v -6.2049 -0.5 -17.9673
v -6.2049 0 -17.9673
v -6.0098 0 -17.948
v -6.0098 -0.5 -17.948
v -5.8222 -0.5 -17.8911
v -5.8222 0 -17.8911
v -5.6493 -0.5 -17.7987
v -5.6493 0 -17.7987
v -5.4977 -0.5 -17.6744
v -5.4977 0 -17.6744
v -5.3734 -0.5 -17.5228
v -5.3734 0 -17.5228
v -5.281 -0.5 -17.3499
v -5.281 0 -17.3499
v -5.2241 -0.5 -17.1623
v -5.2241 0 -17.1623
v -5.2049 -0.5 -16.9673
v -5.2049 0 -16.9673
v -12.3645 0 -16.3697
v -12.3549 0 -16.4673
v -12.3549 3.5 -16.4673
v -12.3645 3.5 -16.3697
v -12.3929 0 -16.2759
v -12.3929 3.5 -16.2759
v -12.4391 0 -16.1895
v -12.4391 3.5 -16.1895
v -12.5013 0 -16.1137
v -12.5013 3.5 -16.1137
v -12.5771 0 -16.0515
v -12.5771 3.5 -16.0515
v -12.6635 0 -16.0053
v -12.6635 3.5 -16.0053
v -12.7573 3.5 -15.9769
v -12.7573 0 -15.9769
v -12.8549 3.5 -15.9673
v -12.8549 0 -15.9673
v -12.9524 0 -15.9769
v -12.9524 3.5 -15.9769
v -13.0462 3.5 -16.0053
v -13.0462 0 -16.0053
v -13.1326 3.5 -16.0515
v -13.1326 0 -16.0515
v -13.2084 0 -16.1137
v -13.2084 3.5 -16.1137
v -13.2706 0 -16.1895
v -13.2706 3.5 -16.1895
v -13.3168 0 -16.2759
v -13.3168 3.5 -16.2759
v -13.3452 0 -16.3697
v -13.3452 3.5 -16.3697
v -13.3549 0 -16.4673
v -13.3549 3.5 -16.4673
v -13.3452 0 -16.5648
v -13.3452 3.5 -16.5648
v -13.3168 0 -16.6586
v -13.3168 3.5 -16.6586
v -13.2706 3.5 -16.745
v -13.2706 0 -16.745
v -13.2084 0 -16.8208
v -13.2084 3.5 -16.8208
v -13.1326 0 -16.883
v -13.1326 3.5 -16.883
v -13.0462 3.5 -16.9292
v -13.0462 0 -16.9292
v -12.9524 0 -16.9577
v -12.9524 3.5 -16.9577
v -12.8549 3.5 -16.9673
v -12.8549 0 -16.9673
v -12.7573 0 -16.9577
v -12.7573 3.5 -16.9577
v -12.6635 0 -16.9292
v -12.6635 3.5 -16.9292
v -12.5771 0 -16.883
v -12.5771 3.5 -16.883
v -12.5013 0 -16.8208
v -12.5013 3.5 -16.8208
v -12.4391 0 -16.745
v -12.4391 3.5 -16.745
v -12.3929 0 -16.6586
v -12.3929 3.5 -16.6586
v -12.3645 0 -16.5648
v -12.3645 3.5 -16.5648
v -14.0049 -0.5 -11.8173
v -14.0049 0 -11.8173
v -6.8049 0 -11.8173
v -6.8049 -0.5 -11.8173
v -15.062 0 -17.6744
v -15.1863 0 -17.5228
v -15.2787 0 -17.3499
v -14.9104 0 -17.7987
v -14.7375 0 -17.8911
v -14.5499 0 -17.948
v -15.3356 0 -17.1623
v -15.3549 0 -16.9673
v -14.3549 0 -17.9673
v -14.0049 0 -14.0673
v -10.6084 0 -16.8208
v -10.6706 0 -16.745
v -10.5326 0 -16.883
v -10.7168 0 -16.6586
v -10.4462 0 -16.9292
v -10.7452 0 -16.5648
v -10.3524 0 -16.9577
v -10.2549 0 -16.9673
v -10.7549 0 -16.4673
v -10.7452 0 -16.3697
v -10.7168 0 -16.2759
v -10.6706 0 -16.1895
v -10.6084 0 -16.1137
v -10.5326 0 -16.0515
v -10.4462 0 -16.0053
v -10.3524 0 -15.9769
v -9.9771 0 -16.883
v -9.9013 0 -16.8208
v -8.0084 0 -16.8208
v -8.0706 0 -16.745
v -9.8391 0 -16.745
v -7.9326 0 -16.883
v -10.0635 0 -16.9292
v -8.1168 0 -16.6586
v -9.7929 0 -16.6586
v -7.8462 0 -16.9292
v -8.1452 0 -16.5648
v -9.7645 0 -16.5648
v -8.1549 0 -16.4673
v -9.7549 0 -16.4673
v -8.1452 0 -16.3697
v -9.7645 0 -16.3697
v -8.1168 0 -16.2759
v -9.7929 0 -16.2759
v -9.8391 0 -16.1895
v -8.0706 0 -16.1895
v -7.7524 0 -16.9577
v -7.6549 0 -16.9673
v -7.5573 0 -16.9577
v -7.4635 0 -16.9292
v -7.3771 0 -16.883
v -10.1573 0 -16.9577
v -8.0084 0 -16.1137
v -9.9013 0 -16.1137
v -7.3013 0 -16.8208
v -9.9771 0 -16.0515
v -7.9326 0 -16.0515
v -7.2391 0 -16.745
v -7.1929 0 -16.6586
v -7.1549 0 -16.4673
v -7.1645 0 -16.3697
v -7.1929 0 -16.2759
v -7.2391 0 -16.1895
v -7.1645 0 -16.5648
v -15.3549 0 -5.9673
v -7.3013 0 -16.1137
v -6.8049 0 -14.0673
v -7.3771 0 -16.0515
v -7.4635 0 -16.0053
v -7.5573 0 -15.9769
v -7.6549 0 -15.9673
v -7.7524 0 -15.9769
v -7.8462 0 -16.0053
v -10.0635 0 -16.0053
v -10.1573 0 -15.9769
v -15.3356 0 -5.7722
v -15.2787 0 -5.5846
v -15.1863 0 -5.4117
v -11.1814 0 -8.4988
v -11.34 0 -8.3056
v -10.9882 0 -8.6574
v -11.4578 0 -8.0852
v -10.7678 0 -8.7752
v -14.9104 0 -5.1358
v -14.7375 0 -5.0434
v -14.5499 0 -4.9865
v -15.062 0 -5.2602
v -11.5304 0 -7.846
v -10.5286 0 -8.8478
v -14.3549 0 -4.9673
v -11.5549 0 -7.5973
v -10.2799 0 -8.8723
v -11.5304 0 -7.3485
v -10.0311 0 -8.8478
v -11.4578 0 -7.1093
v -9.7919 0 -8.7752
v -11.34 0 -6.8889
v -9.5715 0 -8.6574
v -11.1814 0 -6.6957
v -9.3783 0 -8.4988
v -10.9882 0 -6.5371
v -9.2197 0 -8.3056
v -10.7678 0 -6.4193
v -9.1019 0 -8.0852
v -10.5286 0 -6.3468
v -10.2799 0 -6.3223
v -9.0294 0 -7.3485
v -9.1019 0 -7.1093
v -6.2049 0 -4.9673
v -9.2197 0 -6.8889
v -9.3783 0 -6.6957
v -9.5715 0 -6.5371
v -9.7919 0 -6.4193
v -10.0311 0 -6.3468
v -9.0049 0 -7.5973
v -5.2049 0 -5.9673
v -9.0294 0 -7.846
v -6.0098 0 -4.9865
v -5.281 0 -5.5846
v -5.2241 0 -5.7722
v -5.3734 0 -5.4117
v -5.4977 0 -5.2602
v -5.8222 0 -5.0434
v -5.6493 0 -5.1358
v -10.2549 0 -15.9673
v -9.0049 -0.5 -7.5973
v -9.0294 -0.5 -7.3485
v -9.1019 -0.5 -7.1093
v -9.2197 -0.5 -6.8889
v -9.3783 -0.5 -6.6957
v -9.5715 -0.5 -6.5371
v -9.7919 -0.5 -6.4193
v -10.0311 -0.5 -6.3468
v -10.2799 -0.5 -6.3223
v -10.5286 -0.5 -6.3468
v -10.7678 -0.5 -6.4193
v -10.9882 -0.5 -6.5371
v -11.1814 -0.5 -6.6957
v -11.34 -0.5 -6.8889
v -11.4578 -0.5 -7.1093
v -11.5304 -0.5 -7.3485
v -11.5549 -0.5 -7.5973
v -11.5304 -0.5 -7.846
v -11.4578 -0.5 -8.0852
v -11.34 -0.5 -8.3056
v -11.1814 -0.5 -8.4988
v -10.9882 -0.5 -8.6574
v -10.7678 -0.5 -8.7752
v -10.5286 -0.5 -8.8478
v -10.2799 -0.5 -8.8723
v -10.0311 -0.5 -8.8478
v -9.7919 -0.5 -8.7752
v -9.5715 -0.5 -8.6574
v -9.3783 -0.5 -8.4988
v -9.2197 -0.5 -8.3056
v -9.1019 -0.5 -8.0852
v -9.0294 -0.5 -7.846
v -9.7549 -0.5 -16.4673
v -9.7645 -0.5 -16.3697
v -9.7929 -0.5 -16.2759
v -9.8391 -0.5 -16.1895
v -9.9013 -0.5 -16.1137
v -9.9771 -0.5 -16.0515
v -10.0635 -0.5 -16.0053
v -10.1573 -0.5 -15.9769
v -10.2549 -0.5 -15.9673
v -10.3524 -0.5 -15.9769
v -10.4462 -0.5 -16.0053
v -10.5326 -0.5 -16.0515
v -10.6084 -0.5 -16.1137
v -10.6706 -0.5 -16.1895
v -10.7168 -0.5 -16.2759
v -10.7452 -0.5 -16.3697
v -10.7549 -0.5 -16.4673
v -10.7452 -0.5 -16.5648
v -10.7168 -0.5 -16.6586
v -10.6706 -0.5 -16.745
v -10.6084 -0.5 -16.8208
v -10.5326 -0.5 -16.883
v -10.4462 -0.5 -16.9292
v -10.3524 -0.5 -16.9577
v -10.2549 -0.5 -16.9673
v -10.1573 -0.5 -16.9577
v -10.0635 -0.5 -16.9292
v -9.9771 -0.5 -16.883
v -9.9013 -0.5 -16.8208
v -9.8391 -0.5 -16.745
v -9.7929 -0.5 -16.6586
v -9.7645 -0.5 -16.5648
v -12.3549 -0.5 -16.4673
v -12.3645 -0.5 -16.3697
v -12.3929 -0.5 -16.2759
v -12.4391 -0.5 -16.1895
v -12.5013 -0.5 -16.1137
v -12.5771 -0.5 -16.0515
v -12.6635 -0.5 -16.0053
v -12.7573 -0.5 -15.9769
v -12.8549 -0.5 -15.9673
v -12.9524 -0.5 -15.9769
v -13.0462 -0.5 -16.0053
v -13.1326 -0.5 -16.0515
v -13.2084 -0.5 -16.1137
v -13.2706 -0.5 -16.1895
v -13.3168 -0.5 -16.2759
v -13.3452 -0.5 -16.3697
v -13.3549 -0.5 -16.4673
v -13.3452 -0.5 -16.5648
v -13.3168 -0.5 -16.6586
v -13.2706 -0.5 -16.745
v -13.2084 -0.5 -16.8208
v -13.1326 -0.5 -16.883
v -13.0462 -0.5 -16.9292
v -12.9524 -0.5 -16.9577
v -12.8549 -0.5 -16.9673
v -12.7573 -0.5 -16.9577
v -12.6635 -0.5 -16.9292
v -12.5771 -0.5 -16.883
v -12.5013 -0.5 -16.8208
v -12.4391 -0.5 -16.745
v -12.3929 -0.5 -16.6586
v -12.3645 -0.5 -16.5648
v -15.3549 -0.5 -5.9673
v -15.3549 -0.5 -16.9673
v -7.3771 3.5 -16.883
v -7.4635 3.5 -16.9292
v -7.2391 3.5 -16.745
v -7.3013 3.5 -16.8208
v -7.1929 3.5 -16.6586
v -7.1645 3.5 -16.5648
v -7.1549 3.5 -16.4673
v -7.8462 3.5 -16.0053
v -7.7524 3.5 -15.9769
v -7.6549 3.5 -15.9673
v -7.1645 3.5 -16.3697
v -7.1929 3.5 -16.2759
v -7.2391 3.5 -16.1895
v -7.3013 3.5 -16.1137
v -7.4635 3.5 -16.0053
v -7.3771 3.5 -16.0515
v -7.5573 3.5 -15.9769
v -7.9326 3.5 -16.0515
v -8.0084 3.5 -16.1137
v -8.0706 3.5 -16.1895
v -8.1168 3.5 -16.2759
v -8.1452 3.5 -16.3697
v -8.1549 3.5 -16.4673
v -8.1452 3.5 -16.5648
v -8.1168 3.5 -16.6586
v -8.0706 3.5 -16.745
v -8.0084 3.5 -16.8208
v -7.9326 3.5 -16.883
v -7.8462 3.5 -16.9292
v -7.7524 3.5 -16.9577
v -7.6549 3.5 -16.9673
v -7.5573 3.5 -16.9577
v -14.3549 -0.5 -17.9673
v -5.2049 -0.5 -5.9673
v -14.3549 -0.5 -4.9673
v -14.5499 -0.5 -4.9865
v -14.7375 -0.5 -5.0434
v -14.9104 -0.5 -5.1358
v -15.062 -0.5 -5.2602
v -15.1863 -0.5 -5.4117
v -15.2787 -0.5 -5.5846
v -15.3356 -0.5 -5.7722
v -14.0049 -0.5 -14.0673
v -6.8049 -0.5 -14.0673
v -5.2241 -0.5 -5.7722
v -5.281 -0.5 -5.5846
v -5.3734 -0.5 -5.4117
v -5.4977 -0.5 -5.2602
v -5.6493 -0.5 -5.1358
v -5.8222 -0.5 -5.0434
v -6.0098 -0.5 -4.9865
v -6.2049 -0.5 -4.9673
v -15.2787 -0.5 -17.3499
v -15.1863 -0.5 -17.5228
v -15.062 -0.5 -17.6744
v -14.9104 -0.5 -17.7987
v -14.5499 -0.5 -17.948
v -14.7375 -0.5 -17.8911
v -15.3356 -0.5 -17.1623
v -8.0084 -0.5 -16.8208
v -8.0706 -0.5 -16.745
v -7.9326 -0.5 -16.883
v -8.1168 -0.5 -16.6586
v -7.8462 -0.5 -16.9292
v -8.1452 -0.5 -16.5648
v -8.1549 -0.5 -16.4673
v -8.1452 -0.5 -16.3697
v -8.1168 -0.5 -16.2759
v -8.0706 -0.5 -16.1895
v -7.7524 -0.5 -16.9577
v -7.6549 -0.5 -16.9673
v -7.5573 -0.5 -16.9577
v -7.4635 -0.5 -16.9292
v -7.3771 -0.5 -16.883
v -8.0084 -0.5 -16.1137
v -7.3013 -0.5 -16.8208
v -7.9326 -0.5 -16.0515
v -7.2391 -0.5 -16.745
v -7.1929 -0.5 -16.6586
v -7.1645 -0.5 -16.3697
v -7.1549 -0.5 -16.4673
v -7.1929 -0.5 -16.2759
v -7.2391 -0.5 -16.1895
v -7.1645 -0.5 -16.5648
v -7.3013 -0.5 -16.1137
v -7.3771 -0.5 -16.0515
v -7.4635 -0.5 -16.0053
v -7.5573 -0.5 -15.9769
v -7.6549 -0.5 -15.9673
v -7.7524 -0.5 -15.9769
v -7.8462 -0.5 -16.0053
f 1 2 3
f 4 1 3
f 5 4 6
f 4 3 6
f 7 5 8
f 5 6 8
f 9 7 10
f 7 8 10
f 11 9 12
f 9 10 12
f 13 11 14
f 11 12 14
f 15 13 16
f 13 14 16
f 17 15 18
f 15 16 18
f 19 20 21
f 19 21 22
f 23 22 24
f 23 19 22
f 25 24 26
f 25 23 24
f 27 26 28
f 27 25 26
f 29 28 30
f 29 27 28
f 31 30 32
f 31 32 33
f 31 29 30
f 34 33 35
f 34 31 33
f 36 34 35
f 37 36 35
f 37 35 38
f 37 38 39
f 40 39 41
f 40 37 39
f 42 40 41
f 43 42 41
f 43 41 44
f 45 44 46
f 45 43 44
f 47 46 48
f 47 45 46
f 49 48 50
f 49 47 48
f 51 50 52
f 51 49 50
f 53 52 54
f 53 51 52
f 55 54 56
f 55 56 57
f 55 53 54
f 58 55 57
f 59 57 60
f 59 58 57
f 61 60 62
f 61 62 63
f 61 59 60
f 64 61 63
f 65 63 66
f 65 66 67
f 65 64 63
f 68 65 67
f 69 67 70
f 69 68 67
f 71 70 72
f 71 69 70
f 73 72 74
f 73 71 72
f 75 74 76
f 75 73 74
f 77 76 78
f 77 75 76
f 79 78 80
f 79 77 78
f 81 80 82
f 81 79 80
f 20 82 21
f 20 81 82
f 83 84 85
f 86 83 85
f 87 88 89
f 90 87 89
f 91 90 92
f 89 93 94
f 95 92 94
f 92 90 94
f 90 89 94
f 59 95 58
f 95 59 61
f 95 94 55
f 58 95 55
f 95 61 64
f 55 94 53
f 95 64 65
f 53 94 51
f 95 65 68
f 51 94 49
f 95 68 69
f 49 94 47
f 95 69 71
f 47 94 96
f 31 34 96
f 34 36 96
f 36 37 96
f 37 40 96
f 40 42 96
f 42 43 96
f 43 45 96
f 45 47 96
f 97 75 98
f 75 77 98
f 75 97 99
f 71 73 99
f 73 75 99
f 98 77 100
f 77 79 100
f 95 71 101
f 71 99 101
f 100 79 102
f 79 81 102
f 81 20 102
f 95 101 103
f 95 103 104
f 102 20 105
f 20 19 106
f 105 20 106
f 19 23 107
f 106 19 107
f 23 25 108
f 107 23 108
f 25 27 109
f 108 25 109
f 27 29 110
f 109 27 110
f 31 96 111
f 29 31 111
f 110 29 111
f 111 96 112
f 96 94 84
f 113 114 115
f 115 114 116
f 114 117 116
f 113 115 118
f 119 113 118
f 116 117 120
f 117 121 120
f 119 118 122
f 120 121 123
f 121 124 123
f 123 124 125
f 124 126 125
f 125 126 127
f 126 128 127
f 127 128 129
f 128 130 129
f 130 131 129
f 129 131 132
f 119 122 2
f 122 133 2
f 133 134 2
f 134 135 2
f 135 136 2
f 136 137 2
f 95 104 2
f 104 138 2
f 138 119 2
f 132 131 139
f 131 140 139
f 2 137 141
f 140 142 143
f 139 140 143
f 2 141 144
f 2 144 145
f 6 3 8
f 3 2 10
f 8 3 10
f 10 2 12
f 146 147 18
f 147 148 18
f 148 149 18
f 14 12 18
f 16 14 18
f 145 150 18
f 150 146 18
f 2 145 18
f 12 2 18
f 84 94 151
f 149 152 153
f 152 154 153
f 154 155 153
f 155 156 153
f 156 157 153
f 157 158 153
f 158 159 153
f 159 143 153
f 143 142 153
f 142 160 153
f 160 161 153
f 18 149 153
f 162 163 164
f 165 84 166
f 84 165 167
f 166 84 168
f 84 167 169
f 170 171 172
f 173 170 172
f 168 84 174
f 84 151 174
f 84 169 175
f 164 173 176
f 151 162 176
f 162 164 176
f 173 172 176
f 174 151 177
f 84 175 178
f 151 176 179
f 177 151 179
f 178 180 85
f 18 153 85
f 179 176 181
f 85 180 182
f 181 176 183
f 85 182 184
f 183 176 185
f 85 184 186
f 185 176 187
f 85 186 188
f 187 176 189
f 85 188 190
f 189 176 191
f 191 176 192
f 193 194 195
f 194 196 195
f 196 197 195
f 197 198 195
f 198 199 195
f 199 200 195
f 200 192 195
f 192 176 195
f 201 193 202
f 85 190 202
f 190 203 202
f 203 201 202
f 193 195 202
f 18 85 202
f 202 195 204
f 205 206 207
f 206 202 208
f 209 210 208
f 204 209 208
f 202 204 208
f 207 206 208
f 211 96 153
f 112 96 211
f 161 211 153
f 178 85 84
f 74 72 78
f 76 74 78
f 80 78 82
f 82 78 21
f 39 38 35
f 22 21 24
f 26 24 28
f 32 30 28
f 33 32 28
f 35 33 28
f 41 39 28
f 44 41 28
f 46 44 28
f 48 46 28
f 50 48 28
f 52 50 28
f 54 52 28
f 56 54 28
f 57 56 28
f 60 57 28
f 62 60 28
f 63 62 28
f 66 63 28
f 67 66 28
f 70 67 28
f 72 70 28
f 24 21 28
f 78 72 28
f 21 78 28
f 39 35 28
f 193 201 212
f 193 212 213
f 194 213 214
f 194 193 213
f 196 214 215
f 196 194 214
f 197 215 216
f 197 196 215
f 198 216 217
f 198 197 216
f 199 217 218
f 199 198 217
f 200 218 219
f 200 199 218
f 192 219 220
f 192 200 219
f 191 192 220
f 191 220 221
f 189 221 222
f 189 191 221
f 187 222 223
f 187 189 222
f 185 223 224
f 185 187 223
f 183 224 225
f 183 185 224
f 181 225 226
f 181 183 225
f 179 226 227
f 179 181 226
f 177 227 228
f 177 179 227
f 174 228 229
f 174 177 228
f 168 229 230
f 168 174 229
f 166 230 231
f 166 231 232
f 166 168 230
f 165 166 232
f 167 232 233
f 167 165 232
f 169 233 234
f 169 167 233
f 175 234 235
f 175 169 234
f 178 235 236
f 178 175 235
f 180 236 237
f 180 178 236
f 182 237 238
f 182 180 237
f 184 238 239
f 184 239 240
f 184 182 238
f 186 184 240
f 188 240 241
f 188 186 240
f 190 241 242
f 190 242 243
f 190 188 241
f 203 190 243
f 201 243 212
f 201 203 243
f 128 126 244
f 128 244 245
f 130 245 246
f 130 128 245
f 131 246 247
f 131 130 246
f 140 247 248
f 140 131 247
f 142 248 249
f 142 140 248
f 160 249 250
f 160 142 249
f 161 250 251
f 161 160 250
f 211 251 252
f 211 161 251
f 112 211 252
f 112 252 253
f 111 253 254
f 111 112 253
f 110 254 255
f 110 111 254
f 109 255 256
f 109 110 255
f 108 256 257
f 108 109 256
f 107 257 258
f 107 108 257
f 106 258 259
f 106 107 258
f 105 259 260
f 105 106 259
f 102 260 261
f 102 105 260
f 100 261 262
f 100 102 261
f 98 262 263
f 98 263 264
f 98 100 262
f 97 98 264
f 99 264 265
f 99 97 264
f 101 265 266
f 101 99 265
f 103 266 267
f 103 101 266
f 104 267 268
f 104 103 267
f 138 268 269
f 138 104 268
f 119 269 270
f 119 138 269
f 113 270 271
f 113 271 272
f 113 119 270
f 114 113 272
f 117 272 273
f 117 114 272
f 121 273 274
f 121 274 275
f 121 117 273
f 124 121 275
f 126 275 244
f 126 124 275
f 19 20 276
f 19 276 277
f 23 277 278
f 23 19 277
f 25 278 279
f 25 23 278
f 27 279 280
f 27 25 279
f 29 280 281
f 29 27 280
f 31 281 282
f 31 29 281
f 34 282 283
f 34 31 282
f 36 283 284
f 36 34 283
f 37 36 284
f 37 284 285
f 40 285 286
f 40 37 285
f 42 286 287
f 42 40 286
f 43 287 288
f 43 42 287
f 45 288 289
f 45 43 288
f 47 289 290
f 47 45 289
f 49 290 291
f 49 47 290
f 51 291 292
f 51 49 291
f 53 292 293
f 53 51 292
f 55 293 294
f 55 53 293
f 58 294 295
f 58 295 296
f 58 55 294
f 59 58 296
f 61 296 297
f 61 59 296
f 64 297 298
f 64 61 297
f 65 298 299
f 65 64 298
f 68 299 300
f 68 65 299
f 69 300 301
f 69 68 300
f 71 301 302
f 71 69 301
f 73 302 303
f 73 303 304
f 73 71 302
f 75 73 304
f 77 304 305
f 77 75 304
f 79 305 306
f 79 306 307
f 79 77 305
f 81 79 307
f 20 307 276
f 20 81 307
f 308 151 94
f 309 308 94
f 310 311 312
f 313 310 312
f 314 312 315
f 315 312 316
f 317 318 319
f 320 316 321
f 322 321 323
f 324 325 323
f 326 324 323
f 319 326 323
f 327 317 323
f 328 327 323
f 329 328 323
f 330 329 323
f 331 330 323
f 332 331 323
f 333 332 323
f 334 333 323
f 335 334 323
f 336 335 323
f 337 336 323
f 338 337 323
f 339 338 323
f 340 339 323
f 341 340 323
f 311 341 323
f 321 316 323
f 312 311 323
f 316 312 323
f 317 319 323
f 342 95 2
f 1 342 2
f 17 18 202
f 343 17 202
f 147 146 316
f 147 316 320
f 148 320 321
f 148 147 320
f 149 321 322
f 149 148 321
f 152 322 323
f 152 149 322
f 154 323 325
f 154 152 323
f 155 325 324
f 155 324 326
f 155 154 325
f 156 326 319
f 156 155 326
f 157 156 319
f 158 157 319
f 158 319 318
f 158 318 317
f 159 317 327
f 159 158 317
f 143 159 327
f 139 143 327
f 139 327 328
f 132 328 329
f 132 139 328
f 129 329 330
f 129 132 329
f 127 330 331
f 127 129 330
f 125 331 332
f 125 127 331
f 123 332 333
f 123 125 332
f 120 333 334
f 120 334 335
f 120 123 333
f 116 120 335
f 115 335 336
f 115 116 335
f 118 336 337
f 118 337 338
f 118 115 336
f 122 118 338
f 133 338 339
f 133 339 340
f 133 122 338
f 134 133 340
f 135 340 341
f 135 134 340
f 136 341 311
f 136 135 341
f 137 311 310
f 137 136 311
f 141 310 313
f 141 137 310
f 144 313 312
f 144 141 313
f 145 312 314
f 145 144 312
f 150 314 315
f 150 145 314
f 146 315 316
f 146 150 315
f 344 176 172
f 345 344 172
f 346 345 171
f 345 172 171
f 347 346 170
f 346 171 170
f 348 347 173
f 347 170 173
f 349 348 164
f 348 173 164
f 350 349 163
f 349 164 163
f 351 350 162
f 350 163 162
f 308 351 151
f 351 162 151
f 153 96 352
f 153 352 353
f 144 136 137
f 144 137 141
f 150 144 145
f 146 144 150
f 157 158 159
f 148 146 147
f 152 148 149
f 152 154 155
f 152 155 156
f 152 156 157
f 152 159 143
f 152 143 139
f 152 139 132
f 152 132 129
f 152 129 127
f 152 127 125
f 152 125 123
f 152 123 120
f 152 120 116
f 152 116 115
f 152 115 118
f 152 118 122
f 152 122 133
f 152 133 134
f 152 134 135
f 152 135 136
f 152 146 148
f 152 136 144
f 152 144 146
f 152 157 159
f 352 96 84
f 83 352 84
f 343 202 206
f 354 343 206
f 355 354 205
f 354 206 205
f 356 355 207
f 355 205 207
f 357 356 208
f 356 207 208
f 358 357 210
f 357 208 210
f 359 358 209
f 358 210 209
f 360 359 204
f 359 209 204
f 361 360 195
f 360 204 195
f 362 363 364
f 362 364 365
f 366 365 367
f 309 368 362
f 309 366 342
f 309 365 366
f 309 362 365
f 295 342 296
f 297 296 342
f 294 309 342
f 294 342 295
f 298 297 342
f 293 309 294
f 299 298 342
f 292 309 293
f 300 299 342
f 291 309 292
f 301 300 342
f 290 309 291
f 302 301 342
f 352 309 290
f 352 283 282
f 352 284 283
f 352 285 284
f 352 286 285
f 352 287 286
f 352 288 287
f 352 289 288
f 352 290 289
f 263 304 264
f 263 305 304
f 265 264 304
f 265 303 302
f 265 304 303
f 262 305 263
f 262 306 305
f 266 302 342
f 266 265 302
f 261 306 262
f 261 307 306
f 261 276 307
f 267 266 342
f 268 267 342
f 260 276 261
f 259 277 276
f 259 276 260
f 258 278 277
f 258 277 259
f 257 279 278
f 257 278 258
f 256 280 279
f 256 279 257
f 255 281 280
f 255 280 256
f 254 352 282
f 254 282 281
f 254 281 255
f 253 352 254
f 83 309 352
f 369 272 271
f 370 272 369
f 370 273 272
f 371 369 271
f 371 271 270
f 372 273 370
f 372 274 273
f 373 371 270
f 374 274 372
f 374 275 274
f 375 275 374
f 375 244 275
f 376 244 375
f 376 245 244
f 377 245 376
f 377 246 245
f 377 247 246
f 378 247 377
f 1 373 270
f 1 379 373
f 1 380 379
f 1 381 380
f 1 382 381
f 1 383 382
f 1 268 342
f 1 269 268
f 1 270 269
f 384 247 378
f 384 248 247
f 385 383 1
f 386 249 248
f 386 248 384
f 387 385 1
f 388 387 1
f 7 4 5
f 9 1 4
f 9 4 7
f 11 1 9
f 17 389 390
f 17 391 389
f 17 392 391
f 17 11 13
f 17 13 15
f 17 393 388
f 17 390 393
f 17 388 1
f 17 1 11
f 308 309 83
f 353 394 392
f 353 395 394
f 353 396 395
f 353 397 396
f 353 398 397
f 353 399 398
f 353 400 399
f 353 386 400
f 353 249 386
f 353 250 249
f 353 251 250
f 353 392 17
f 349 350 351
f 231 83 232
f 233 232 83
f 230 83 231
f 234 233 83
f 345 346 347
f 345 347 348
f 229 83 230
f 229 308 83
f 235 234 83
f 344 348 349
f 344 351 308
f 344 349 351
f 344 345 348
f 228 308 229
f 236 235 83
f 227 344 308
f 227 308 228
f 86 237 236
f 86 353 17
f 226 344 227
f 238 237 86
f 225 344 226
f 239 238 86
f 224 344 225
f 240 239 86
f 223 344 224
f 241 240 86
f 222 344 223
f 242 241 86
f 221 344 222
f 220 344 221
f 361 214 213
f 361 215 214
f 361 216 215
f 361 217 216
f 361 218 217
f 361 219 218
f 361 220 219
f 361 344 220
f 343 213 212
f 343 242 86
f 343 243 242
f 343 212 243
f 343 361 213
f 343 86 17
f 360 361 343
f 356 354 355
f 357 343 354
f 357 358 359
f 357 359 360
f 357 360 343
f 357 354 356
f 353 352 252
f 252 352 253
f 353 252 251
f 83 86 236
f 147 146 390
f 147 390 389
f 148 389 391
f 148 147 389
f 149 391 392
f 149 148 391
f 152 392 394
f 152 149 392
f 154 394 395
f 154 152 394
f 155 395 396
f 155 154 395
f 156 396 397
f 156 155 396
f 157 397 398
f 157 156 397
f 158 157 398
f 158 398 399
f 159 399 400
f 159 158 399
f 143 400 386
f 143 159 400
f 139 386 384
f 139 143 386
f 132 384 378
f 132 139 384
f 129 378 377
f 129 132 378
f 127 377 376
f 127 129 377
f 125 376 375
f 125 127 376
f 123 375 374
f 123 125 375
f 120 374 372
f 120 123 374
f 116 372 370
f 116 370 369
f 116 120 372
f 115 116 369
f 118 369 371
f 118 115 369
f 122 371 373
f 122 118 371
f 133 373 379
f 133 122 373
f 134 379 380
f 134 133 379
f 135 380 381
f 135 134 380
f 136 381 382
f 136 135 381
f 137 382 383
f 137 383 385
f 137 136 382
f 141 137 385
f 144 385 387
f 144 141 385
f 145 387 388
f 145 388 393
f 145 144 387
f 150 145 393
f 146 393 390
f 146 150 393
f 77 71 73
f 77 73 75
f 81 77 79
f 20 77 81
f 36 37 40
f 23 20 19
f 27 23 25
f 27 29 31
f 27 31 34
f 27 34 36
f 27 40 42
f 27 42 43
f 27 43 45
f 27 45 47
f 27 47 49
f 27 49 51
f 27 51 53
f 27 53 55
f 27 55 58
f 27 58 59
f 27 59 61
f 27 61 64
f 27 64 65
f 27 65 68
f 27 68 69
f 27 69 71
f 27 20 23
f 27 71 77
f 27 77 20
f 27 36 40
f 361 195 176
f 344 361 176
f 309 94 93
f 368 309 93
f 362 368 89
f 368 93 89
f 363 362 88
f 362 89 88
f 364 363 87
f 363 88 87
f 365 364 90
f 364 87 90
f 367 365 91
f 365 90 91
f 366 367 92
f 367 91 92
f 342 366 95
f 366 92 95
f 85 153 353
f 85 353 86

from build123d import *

# Parameters (mm, degrees)
F0_R     = 0.5
F0_W     = 7.2
F0_H     = 2.25
F0_R_2   = 1.275
F1_DEPTH = 0.5
F2_DEPTH = 3.5
F3_DEPTH = 1


# Not quite as in the source:
# - a feature names something its author has since deleted; it is built from what else it names


with BuildPart() as f1:
    # F0 (on Front) → F1 (new body)
    with BuildSketch(Plane.XZ):
        with BuildLine():
            ThreePointArc((-14.3548552409, -4.9672579244), (-15.0619620221, -5.2601511432), (-15.3548552409, -5.9672579244))
            Line((-15.3548552409, -5.9672579244), (-15.3548552409, -16.9672579244))
            ThreePointArc((-15.3548552409, -16.9672579244), (-15.0619620221, -17.6743647056), (-14.3548552409, -17.9672579244))
            Line((-14.3548552409, -17.9672579244), (-6.2048552409, -17.9672579244))
            ThreePointArc((-6.2048552409, -17.9672579244), (-5.4977484597, -17.6743647056), (-5.2048552409, -16.9672579244))
            Line((-5.2048552409, -16.9672579244), (-5.2048552409, -5.9672579244))
            ThreePointArc((-5.2048552409, -5.9672579244), (-5.4977484597, -5.2601511432), (-6.2048552409, -4.9672579244))
            Line((-6.2048552409, -4.9672579244), (-14.3548552409, -4.9672579244))
        make_face()
        with Locations((-12.8548552409, -16.4672579244)):
            Circle(F0_R, mode=Mode.SUBTRACT)
        with Locations((-10.4048552409, -12.9422579244)):
            Rectangle(F0_W, F0_H, mode=Mode.SUBTRACT)
        with Locations((-10.2548552409, -16.4672579244)):
            Circle(F0_R, mode=Mode.SUBTRACT)
        with Locations((-7.6548552409, -16.4672579244)):
            Circle(F0_R, mode=Mode.SUBTRACT)
        with Locations((-10.2798552409, -7.5972579244)):
            Circle(F0_R_2, mode=Mode.SUBTRACT)
    extrude(amount=F1_DEPTH)

    # F0 (on Front) → F3 (cut)
    with BuildSketch(Plane.XZ):
        with Locations((-10.4048552409, -12.9422579244)):
            Rectangle(F0_W, F0_H)
    extrude(amount=-F3_DEPTH, mode=Mode.SUBTRACT)


with BuildPart() as f2:
    # F0 (on Front) → F2 (new body)
    with BuildSketch(Plane.XZ):
        with Locations((-12.8548552409, -16.4672579244)):
            Circle(F0_R)
    extrude(amount=-F2_DEPTH)


with BuildPart() as f2b:
    # F0 (on Front) → F2, piece 2 (new body)
    with BuildSketch(Plane.XZ):
        with Locations((-7.6548552409, -16.4672579244)):
            Circle(F0_R)
    extrude(amount=-F2_DEPTH)


solid = Compound([f1.part, f2.part, f2b.part])
